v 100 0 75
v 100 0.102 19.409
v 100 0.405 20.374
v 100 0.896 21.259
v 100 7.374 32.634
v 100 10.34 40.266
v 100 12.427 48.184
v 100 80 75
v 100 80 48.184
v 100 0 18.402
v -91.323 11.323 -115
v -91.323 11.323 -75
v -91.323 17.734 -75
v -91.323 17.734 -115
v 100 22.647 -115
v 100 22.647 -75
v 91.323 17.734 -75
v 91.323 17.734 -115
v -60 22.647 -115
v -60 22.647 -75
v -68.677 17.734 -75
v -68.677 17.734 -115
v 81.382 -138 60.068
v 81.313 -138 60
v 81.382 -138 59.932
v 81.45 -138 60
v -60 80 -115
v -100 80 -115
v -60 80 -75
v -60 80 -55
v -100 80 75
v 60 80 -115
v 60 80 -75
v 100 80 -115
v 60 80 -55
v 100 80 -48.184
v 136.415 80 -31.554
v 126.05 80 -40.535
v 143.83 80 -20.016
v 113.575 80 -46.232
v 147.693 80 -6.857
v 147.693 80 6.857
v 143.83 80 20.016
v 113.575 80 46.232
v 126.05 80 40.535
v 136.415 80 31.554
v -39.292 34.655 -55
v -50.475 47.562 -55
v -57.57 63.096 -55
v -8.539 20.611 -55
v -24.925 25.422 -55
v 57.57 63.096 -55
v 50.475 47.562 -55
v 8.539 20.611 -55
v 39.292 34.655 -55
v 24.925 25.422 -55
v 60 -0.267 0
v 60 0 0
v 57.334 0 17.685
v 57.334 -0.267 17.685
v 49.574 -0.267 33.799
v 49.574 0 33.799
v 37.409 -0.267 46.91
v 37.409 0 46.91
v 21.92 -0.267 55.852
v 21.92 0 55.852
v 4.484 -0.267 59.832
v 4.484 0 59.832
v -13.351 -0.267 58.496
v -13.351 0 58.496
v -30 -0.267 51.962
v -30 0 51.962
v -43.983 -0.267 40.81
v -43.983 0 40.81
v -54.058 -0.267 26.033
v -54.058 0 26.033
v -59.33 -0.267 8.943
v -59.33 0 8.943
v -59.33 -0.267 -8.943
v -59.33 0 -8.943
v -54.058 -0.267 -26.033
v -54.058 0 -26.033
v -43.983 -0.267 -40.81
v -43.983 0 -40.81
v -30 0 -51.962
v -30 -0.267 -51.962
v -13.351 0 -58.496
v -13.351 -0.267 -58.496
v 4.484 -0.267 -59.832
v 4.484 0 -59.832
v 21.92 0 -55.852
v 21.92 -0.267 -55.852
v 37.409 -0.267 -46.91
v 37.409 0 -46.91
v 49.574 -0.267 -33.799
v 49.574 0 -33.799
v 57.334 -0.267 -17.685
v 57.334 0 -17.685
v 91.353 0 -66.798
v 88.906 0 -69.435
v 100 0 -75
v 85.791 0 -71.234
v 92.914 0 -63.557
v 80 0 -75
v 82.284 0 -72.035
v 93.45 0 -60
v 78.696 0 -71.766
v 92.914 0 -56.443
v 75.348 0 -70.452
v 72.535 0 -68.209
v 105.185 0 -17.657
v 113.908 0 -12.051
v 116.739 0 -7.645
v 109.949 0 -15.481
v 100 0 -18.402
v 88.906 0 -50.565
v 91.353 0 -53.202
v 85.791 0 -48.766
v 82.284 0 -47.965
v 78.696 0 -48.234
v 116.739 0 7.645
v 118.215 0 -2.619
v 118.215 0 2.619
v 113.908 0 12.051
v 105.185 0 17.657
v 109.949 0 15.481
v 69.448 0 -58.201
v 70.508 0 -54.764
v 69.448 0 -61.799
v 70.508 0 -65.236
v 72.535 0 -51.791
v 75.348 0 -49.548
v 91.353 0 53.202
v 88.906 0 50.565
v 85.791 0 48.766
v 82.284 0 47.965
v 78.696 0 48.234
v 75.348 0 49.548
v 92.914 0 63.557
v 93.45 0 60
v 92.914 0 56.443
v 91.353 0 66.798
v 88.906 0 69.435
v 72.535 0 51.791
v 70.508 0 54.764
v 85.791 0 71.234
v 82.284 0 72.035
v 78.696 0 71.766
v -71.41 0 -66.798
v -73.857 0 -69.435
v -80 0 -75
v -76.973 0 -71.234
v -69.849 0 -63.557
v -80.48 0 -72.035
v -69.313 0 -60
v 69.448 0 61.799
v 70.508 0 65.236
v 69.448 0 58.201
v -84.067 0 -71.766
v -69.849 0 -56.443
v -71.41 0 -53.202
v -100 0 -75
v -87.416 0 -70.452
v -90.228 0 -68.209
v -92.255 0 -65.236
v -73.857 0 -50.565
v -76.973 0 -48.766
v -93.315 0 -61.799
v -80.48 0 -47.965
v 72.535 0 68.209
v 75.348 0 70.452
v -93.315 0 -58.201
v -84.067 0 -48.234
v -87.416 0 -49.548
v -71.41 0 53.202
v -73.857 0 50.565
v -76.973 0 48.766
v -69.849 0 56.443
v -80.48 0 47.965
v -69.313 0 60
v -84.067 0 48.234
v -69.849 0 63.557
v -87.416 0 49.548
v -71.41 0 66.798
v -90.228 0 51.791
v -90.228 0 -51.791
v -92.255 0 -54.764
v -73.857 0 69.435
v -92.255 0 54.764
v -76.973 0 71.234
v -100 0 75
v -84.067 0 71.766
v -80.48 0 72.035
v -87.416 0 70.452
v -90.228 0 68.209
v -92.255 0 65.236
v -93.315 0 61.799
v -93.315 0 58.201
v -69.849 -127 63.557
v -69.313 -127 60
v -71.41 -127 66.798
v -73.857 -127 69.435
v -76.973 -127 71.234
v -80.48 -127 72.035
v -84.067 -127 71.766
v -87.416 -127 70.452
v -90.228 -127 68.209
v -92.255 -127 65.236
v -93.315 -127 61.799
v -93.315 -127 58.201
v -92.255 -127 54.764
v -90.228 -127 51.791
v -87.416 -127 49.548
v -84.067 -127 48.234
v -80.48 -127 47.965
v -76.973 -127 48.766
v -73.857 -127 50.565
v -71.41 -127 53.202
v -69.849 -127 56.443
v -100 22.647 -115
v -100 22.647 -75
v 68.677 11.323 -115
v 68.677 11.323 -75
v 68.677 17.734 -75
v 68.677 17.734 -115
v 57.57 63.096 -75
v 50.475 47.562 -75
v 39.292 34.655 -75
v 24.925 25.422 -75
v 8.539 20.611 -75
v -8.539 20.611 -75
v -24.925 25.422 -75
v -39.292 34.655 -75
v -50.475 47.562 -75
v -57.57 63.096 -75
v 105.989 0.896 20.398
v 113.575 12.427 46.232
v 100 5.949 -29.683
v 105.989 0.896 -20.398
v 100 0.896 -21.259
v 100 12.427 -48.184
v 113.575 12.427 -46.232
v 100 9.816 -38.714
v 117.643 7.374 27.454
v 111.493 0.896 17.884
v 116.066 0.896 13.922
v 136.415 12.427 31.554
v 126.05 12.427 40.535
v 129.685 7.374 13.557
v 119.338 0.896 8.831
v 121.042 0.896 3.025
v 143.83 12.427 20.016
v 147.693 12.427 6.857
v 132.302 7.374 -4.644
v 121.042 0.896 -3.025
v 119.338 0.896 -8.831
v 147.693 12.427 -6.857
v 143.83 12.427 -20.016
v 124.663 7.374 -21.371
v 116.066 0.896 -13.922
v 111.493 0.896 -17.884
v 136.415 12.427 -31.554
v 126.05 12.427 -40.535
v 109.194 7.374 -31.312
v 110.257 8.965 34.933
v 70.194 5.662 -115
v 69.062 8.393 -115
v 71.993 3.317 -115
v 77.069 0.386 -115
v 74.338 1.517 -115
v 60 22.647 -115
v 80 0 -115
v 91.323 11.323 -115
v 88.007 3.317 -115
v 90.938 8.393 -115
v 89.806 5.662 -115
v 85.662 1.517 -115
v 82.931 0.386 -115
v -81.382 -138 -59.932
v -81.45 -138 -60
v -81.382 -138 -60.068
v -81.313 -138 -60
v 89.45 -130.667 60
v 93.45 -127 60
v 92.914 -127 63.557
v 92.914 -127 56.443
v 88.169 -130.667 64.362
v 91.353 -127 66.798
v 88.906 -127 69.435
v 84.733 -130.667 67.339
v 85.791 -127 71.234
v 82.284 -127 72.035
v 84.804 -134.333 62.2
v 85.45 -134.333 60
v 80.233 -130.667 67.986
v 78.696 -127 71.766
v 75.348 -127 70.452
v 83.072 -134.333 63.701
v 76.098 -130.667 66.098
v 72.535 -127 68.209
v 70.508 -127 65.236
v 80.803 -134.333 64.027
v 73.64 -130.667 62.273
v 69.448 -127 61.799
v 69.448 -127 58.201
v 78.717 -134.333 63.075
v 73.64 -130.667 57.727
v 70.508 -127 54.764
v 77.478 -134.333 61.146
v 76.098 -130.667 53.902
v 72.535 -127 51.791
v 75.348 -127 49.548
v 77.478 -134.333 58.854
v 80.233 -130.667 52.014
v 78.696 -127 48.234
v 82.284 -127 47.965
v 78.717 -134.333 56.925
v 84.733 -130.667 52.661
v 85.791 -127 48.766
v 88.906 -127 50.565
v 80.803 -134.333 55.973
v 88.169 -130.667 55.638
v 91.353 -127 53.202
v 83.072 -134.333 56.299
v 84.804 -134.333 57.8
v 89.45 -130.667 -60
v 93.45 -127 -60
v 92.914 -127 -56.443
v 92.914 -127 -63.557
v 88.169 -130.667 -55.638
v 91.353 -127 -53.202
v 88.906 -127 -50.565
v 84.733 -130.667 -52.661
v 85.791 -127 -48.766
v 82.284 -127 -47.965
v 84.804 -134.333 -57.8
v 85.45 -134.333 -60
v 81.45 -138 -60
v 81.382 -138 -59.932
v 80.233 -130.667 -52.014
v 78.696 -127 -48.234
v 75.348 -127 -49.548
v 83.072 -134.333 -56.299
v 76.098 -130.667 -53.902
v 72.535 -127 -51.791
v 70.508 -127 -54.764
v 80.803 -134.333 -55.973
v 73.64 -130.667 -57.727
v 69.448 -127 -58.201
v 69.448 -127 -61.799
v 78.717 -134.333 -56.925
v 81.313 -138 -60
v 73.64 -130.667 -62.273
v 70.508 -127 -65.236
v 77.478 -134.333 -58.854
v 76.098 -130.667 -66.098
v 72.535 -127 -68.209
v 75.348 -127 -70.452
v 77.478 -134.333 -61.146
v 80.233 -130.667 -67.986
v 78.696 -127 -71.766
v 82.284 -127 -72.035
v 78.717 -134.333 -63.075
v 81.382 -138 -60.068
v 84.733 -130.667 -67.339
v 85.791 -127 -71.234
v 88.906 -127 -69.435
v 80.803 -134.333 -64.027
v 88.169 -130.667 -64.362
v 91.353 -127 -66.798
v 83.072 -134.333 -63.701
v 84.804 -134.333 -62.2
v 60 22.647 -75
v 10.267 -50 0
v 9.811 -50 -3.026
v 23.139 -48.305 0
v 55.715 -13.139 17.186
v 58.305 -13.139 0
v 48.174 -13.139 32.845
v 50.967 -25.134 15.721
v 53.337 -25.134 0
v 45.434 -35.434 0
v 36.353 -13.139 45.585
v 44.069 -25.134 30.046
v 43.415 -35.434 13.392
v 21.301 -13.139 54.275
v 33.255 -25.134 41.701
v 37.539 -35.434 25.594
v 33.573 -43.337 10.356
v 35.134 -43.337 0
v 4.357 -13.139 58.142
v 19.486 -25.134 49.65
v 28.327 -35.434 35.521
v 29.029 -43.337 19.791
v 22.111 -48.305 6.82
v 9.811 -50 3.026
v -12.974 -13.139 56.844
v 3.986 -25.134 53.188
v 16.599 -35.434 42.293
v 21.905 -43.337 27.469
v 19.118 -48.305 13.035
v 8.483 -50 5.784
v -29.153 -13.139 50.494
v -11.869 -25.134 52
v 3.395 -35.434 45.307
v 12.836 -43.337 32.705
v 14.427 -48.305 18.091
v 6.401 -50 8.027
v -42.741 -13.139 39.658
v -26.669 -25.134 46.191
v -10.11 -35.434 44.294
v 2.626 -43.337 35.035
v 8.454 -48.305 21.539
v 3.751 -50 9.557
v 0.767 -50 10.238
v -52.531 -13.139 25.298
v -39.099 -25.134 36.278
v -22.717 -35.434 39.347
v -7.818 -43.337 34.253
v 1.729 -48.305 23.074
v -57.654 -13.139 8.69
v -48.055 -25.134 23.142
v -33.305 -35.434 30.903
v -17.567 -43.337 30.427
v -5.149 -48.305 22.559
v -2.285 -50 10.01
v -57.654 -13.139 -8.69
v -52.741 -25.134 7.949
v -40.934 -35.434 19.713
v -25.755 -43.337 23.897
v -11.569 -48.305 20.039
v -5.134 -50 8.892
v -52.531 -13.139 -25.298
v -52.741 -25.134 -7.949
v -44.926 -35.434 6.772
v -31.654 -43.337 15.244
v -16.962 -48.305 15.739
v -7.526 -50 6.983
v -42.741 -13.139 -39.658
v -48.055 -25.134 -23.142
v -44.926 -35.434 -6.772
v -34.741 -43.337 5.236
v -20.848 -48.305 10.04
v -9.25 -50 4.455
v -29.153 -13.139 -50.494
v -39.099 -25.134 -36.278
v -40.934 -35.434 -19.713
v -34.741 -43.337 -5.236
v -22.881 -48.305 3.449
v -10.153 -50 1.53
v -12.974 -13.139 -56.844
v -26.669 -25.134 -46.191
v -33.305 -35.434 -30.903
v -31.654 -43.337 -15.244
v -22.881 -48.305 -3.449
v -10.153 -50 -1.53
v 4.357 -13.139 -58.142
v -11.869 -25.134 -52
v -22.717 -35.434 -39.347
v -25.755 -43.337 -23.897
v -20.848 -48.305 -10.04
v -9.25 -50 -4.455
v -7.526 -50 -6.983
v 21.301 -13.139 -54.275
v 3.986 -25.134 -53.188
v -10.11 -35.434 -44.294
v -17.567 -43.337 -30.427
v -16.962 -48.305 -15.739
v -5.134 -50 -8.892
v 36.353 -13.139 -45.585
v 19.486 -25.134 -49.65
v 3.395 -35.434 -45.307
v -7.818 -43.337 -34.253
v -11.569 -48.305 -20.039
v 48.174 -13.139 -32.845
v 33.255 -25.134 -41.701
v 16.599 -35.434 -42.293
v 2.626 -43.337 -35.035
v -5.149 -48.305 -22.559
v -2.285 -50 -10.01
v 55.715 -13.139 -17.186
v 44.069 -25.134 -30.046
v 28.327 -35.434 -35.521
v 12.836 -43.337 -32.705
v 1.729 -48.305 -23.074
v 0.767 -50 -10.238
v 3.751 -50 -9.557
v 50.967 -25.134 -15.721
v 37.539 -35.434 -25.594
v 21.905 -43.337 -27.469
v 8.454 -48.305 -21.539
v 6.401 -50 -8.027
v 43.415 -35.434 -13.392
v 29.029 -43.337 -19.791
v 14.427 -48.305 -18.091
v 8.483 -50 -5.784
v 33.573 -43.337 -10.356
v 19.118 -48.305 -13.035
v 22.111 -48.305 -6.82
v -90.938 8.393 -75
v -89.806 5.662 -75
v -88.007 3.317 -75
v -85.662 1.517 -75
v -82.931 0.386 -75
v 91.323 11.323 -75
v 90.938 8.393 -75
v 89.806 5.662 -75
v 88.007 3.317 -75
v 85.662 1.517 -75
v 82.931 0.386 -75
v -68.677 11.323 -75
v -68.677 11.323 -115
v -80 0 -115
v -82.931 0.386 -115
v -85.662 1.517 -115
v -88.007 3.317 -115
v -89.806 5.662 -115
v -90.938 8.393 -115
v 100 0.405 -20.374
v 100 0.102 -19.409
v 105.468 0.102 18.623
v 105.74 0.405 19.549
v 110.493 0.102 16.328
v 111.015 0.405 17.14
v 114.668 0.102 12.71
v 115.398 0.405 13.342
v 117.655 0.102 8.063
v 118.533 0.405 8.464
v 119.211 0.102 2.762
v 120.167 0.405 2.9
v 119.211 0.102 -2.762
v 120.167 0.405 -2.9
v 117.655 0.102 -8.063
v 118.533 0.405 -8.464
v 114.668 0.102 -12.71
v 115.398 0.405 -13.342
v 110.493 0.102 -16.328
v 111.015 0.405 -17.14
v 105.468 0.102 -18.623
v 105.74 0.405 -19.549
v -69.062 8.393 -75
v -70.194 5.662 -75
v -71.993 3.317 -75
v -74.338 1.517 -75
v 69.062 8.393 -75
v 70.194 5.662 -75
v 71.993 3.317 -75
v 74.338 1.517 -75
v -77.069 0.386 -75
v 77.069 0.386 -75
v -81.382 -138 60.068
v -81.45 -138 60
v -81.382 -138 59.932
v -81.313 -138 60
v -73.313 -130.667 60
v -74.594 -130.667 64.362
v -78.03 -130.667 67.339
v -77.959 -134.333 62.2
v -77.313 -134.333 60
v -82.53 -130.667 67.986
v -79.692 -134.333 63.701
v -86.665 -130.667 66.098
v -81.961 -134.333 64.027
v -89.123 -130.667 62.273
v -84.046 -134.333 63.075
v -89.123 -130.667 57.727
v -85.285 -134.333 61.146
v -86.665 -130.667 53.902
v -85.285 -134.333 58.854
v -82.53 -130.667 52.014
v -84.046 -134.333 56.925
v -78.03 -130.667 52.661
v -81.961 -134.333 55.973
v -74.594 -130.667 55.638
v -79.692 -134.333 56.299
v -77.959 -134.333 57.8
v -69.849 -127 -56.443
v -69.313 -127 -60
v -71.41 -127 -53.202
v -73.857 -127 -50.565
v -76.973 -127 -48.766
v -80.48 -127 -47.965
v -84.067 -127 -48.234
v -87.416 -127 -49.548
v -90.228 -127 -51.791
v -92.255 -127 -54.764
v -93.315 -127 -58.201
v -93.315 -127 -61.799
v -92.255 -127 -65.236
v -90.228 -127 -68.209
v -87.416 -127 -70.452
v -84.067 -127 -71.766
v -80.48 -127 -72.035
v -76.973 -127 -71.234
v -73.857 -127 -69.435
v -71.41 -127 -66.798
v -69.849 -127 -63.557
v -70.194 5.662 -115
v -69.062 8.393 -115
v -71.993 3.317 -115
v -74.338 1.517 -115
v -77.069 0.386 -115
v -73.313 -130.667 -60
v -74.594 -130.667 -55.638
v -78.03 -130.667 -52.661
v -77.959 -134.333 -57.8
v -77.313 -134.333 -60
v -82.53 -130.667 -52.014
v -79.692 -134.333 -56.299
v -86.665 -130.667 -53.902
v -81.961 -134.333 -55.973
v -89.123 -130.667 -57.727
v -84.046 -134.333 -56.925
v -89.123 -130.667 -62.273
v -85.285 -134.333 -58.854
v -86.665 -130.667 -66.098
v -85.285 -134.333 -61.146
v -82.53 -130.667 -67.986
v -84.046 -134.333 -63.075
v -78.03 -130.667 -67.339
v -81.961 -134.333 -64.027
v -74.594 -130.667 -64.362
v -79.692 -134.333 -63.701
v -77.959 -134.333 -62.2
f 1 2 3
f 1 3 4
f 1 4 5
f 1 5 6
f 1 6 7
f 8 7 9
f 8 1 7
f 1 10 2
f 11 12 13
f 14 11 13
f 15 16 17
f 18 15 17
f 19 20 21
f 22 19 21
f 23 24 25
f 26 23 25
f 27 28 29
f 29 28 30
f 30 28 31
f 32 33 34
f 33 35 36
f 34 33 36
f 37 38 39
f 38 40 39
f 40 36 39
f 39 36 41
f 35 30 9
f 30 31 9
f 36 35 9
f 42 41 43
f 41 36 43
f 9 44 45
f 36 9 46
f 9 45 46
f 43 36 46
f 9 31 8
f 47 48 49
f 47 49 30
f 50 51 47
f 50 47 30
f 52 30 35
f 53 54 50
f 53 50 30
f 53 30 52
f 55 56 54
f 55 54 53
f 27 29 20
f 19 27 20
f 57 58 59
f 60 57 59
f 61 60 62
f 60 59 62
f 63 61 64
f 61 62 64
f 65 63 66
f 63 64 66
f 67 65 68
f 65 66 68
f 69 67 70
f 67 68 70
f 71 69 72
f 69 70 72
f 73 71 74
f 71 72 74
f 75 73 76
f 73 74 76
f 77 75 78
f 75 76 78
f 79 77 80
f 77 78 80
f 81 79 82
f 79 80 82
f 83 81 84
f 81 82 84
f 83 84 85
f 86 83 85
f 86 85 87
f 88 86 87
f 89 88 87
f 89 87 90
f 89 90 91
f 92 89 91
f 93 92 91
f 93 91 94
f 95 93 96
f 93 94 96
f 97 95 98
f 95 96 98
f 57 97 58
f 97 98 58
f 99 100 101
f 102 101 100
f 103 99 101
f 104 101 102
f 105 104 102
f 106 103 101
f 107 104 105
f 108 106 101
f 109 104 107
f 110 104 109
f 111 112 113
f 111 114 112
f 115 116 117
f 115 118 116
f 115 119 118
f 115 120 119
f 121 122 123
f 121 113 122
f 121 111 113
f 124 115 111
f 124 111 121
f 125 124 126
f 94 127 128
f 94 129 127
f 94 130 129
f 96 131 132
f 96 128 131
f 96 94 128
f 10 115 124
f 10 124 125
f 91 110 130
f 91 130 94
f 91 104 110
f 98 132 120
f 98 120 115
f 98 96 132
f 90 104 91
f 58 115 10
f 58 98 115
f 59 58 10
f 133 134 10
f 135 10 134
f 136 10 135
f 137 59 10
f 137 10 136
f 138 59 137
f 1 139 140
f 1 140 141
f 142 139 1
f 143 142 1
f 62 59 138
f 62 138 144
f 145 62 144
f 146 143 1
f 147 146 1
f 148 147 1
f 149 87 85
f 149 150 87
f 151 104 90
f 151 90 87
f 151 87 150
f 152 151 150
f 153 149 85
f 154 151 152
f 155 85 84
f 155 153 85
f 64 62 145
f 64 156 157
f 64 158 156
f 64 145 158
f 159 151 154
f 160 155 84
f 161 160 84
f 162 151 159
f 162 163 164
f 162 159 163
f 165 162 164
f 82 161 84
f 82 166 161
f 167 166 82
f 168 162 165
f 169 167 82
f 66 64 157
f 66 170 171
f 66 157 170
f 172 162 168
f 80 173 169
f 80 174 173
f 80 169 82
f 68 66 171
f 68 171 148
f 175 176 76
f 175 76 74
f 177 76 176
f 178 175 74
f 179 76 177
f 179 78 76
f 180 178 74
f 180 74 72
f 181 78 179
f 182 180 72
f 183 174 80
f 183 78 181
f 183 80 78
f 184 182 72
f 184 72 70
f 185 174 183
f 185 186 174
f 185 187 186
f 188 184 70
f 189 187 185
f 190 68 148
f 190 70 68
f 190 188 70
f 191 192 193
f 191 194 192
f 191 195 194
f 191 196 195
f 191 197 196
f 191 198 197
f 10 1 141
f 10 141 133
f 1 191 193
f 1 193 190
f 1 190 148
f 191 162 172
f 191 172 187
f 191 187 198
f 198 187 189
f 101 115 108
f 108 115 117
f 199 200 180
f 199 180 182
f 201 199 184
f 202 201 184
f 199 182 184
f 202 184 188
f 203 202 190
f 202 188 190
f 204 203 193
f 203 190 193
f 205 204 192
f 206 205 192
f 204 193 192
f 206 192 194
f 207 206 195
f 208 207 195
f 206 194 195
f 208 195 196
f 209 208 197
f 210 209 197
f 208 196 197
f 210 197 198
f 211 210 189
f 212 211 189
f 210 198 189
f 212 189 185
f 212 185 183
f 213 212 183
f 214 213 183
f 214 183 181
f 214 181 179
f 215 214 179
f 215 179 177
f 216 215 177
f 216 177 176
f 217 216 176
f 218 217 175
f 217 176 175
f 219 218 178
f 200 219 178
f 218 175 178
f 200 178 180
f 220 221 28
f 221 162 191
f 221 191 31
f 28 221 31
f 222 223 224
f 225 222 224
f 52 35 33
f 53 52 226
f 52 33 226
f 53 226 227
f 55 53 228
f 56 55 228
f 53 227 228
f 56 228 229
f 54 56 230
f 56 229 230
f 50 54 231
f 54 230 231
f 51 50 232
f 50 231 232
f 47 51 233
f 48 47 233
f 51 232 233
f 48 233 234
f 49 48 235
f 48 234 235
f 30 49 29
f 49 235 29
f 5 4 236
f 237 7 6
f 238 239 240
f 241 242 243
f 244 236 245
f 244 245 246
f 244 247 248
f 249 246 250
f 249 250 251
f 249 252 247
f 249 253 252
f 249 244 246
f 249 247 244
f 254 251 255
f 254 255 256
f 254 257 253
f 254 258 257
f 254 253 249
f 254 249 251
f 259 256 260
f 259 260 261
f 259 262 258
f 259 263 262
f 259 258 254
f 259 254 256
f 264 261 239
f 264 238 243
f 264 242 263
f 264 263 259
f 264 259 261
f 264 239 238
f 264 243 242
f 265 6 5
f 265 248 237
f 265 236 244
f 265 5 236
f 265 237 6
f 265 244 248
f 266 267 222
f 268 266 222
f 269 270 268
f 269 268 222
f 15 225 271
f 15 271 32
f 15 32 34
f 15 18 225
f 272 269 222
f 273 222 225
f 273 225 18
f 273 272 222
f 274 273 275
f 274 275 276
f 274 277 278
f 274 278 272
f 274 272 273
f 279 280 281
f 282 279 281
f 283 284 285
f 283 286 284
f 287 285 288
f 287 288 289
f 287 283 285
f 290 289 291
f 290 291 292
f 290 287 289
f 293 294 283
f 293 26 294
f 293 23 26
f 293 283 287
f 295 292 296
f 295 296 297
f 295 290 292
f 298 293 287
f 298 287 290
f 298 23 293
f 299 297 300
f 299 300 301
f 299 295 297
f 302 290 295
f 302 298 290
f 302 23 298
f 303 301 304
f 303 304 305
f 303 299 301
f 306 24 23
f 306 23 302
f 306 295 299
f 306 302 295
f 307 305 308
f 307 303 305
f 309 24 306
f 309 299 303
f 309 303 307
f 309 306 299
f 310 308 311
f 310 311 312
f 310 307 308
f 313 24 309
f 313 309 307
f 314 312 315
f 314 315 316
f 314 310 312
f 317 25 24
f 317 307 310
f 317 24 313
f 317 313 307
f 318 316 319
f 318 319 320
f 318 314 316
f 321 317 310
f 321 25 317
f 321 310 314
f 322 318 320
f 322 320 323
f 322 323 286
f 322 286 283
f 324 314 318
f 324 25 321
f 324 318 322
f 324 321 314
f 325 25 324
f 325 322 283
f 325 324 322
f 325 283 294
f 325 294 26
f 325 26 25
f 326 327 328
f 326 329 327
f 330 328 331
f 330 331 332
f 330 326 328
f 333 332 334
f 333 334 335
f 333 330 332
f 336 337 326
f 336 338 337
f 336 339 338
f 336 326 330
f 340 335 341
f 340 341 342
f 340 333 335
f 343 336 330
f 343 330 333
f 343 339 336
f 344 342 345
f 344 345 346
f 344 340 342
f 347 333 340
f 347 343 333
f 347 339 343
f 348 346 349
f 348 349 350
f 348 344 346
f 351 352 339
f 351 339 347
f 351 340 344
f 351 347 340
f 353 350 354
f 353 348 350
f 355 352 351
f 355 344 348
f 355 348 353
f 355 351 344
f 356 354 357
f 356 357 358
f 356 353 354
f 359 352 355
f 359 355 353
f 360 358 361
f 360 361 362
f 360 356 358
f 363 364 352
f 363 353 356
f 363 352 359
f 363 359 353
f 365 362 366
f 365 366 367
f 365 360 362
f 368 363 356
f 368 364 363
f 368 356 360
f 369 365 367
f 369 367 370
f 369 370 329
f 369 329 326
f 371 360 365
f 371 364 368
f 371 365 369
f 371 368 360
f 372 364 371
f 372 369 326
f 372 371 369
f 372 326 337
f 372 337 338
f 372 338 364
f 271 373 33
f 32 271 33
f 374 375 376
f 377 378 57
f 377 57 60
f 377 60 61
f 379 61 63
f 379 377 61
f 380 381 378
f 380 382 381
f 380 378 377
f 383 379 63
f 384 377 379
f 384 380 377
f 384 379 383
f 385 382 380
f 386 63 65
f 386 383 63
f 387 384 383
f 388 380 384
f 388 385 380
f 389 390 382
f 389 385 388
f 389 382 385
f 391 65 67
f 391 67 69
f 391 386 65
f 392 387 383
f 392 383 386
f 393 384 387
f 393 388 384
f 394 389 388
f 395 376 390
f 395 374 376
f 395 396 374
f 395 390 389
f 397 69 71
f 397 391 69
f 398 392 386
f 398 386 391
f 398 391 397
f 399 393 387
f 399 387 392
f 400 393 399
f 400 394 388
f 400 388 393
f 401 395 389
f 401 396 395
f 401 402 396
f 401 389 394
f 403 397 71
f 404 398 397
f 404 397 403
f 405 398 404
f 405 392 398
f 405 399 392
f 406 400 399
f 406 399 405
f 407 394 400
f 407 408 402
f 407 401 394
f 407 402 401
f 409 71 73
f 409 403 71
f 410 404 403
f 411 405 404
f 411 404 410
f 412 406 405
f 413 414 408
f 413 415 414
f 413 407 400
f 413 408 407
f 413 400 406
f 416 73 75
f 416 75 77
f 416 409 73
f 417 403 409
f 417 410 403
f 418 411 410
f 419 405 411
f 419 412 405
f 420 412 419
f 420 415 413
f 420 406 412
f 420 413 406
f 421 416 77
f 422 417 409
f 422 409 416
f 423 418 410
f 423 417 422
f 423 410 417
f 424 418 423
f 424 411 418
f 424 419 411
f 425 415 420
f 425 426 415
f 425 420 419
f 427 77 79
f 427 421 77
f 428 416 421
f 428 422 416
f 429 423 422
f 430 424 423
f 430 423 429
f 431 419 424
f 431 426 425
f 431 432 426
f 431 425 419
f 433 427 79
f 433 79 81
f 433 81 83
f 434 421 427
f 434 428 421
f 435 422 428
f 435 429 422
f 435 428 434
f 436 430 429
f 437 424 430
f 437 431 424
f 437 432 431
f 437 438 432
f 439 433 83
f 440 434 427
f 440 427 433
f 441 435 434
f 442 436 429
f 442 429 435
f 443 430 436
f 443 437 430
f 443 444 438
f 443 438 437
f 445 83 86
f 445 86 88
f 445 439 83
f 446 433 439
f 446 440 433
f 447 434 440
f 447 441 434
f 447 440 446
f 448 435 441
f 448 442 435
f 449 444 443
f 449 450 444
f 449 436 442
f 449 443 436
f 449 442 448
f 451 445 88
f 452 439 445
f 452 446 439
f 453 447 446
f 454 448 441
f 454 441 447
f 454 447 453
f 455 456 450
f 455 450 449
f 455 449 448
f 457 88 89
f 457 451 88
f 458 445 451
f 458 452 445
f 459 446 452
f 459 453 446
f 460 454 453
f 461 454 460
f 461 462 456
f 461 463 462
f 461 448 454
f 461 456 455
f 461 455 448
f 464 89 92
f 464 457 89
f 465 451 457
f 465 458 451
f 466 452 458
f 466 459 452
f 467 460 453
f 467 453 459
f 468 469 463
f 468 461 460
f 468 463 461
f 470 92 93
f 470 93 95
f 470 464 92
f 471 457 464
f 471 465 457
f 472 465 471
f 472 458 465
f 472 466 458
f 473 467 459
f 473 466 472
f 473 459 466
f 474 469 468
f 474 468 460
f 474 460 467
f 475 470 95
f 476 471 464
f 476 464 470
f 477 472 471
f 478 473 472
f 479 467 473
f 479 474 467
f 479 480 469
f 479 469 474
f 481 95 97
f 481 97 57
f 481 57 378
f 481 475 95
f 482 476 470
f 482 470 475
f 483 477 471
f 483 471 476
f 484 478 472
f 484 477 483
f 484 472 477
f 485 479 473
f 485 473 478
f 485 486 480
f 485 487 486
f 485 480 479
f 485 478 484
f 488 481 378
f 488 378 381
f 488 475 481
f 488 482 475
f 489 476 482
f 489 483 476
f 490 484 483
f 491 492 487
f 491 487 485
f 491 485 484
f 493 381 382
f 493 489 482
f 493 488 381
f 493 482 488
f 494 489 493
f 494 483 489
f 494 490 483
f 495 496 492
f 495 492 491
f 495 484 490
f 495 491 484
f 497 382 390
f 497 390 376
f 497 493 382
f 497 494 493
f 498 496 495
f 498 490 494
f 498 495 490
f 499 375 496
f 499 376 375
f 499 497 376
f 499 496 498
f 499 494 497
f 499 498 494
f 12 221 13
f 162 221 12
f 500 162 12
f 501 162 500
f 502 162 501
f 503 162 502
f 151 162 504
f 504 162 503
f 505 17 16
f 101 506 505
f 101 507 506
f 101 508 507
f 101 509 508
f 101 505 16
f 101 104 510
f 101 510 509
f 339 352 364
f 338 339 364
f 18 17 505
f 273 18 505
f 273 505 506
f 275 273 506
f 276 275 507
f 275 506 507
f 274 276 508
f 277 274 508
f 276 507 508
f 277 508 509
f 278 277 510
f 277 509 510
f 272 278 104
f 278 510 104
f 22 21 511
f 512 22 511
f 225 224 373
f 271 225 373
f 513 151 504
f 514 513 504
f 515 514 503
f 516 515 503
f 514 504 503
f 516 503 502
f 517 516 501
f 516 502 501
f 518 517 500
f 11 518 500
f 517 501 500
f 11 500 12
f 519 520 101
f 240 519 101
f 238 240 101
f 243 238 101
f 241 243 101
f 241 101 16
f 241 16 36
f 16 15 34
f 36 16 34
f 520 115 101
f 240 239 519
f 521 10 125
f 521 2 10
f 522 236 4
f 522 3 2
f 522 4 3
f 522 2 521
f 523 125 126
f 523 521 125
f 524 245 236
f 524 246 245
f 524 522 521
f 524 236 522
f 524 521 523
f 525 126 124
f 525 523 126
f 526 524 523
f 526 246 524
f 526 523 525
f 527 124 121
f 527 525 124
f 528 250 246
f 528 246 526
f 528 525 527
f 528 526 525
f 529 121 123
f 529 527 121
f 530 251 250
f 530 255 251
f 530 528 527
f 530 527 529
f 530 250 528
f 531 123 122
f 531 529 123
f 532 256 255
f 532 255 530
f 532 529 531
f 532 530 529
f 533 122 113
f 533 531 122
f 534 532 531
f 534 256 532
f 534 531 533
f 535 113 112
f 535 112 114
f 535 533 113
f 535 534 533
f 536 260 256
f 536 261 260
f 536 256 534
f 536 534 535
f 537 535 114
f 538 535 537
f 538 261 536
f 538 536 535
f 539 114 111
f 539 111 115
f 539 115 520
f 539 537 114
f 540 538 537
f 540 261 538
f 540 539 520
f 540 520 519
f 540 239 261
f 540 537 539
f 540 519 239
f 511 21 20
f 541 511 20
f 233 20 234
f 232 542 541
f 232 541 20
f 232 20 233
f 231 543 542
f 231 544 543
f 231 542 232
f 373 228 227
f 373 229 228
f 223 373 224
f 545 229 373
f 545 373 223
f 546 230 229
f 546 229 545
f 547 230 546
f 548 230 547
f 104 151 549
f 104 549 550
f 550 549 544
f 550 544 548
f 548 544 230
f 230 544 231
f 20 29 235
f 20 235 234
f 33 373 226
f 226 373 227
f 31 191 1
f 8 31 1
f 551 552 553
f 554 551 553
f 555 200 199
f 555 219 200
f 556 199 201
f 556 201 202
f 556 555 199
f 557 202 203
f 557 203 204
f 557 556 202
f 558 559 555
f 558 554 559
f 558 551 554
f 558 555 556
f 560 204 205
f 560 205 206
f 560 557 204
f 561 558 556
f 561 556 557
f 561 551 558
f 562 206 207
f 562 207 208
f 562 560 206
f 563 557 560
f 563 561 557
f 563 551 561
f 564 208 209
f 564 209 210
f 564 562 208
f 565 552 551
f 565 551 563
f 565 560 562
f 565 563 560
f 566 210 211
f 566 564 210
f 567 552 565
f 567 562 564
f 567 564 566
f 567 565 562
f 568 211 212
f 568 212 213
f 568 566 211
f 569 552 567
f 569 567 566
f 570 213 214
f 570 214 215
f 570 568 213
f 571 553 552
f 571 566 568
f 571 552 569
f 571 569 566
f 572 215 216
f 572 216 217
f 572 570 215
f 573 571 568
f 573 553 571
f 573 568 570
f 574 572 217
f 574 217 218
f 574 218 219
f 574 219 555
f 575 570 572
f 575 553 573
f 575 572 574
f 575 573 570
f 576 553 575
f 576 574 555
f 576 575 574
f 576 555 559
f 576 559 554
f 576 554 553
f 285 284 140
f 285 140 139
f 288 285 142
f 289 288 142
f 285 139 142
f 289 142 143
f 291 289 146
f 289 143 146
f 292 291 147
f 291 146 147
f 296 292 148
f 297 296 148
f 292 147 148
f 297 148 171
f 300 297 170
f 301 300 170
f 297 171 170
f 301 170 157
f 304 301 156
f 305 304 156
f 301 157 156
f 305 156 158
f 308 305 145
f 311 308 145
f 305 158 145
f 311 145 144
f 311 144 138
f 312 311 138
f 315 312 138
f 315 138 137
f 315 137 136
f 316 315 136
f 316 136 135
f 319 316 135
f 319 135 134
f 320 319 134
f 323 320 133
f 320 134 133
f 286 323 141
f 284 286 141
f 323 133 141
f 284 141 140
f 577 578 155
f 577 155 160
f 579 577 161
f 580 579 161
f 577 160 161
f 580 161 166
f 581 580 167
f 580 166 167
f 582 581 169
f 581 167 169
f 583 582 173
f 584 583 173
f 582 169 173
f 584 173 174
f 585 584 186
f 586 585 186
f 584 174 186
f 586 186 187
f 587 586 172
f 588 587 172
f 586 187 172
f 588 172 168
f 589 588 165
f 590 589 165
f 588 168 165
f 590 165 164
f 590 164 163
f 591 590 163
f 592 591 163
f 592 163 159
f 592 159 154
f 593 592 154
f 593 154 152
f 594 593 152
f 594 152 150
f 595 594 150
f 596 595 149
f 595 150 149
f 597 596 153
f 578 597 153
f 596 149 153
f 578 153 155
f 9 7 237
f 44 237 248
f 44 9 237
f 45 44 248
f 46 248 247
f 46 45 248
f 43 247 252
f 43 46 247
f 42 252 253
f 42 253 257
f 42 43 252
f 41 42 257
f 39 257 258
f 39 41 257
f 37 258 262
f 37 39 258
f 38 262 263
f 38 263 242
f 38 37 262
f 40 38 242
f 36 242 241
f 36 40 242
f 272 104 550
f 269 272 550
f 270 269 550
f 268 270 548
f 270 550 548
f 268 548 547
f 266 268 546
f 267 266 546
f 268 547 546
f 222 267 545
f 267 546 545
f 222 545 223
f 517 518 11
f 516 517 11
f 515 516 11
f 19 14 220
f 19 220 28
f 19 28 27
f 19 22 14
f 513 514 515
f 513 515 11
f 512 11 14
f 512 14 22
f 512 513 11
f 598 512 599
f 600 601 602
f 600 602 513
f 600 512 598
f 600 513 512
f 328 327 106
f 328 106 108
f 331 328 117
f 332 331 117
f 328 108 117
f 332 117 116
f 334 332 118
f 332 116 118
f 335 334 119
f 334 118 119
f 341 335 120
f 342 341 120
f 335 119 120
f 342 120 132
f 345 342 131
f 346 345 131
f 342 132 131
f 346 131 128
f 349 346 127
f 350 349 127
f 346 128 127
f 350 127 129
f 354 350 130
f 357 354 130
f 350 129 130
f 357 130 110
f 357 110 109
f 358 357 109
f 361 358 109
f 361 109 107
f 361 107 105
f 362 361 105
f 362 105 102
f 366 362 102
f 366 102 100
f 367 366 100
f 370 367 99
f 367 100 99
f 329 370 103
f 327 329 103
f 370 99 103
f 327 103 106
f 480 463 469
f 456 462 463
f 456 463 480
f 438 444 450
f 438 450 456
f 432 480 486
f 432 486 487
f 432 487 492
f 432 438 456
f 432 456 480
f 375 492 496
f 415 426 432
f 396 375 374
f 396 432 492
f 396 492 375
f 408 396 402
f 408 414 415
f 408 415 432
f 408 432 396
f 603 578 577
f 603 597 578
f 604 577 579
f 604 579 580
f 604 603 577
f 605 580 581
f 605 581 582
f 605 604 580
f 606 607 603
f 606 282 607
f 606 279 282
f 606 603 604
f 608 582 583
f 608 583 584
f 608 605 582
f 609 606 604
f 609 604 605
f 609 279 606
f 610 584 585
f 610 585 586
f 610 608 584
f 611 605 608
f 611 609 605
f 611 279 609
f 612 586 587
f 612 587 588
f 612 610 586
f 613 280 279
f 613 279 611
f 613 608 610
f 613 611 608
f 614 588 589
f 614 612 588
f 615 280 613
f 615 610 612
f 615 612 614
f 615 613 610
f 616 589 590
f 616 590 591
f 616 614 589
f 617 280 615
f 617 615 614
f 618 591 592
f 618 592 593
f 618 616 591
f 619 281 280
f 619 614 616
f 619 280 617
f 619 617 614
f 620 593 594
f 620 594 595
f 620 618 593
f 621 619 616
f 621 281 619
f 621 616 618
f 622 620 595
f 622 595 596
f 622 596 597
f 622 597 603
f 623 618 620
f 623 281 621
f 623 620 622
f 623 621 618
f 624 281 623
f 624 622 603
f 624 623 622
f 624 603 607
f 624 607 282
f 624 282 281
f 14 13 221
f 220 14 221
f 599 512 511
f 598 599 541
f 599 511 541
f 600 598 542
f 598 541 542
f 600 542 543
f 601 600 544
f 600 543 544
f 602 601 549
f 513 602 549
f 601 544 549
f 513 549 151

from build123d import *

# Parameters (mm, degrees)
F0_W         = 200
F0_H         = 150
F0_R         = 12.0683860383
F0_R_2       = 60
F1_DEPTH     = 80
F2_DEPTH     = 138
F3_C1_SIZE2  = 12
F3_C1_SIZE   = 11
F3_C2_SIZE2  = 12
F3_C2_SIZE   = 11
F3_C3_SIZE2  = 12
F3_C3_SIZE   = 11
F3_C4_SIZE2  = 12
F3_C4_SIZE   = 11
F4_DEPTH     = 50
F5_R         = 49.7327993849
F7_DEPTH     = 40
F8_DEPTH     = 20
F11_T2_ANGLE = 180


# Not quite as in the source:
# - a fillet or chamfer that OpenCascade refuses, or shapes differently, is made with other operations: its cross-section is extruded or revolved along the edge and cut away or added


with BuildPart() as f1:
    # F0 (on Front) → F1 (new body)
    with BuildSketch(Plane.XZ):
        Rectangle(F0_W, F0_H)
        with Locations((-81.3817187923, -60)):
            Circle(F0_R, mode=Mode.SUBTRACT)
        with Locations((81.3817187923, -60)):
            Circle(F0_R, mode=Mode.SUBTRACT)
        with Locations((-81.3817187923, 60)):
            Circle(F0_R, mode=Mode.SUBTRACT)
        Circle(F0_R_2, mode=Mode.SUBTRACT)
        with Locations((81.3817187923, 60)):
            Circle(F0_R, mode=Mode.SUBTRACT)
        Circle(F0_R_2)
        with Locations((81.3817187923, -60)):
            Circle(F0_R)
        with Locations((-81.3817187923, 60)):
            Circle(F0_R)
        with Locations((-81.3817187923, -60)):
            Circle(F0_R)
        with Locations((81.3817187923, 60)):
            Circle(F0_R)
    extrude(amount=-F1_DEPTH)

    # F0 (on Front) → F2 (join)
    with BuildSketch(Plane.XZ):
        with Locations((-81.3817187923, 60)):
            Circle(F0_R)
        with Locations((81.3817187923, 60)):
            Circle(F0_R)
        with Locations((81.3817187923, -60)):
            Circle(F0_R)
        with Locations((-81.3817187923, -60)):
            Circle(F0_R)
    extrude(amount=F2_DEPTH)

    # F3: chamfer of 12 x 11 on 4 edges, made by hand

    # F3_c1
    f3_c1_edges = [f1.edges().sort_by_distance(p)[0] for p in [
        (-93.4501048306, -138, -60),
    ]]
    f3_c1_side = f1.faces().sort_by_distance((-93.4501048306, -137.78, -60))[0]
    chamfer(f3_c1_edges, length=F3_C1_SIZE, length2=F3_C1_SIZE2, reference=f3_c1_side)

    # F3_c2
    f3_c2_edges = [f1.edges().sort_by_distance(p)[0] for p in [
        (69.313332754, -138, -60),
    ]]
    f3_c2_side = f1.faces().sort_by_distance((69.313332754, -137.78, -60))[0]
    chamfer(f3_c2_edges, length=F3_C2_SIZE, length2=F3_C2_SIZE2, reference=f3_c2_side)

    # F3_c3
    f3_c3_edges = [f1.edges().sort_by_distance(p)[0] for p in [
        (-93.4501048306, -138, 60),
    ]]
    f3_c3_side = f1.faces().sort_by_distance((-93.4501048306, -137.78, 60))[0]
    chamfer(f3_c3_edges, length=F3_C3_SIZE, length2=F3_C3_SIZE2, reference=f3_c3_side)

    # F3_c4
    f3_c4_edges = [f1.edges().sort_by_distance(p)[0] for p in [
        (69.313332754, -138, 60),
    ]]
    f3_c4_side = f1.faces().sort_by_distance((69.313332754, -137.78, 60))[0]
    chamfer(f3_c4_edges, length=F3_C4_SIZE, length2=F3_C4_SIZE2, reference=f3_c4_side)

    # F0 (on Front) → F4 (join)
    with BuildSketch(Plane.XZ):
        Circle(F0_R_2)
    extrude(amount=F4_DEPTH)

    # F5
    f5_edges = [f1.edges().sort_by_distance(p)[0] for p in [
        (-60, -50, 0),
    ]]
    fillet(f5_edges, radius=F5_R)

    # F6 (on face) → F7 (join)
    with BuildSketch(Plane(origin=(0, 0, -75), x_dir=(1, 0, 0), z_dir=(0, 0, -1))):
        with BuildLine():
            ThreePointArc((-68.6766029522, -11.3233970478), (-71.9931491676, -3.316546203), (-80.0000000175, 0))
            ThreePointArc((-80.0000000175, 0), (-88.0068508448, -3.3165462154), (-91.3233970478, -11.3233970478))
            Line((-91.3233970478, -11.3233970478), (-91.3233970478, -17.7343630829))
            Line((-91.3233970478, -17.7343630829), (-100, -22.6467940956))
            Line((-100, -22.6467940956), (-100, -80))
            Line((-100, -80), (-60, -80))
            Line((-60, -80), (-60, -22.6467940956))
            Line((-60, -22.6467940956), (-68.6766029522, -17.7343630829))
            Line((-68.6766029522, -17.7343630829), (-68.6766029522, -11.3233970478))
        make_face()
        with BuildLine():
            Line((68.6766029522, -17.7343630829), (60, -22.6467940956))
            Line((60, -22.6467940956), (60, -80))
            Line((60, -80), (100, -80))
            Line((100, -80), (100, -22.6467940956))
            Line((100, -22.6467940956), (91.3233970478, -17.7343630829))
            Line((91.3233970478, -17.7343630829), (91.3233970478, -11.3233970478))
            ThreePointArc((91.3233970478, -11.3233970478), (88.0068508386, -3.3165462092), (80, 0))
            ThreePointArc((80, 0), (71.9931491614, -3.3165462092), (68.6766029522, -11.3233970478))
            Line((68.6766029522, -11.3233970478), (68.6766029522, -17.7343630829))
        make_face()
    extrude(amount=F7_DEPTH)

    # F6 (on face) → F8 (cut)
    with BuildSketch(Plane(origin=(0, 0, -75), x_dir=(1, 0, 0), z_dir=(0, 0, -1))):
        with BuildLine():
            ThreePointArc((60, -80), (0, -20), (-60, -80))
            Line((-60, -80), (60, -80))
        make_face()
    extrude(amount=-F8_DEPTH, mode=Mode.SUBTRACT)

    # F9 (on face) → F10 (revolve)
    with BuildSketch(Plane.YZ.offset(100)):
        with BuildLine():
            Line((80, 0), (0, 0))
            Line((0, 0), (0, -20))
            ThreePointArc((0, -20), (7.7276234195, -33.4243037519), (12.4269118533, -48.1838695705))
            Line((12.4269118533, -48.1838695705), (80, -48.1838695705))
            Line((80, -48.1838695705), (80, 0))
        make_face()
    revolve(axis=Axis((100, 40, 0), (0, 1, 0)))

    # F11: fillet of radius 5 on 1 edges, made by hand

    # F11_s1 → F11_t2 (revolve, cut)
    with BuildSketch(Plane.YZ.offset(100)):
        with BuildLine():
            ThreePointArc((0, 18.4024363766), (0.2292975701, 19.8992323966), (0.8961593302, 21.2587437405))
            ThreePointArc((0.8961593302, 21.2587437405), (0.451433447, 20.6269841539), (0, 20))
            Line((0, 20), (0, 18.4024363766))
        make_face()
    revolve(axis=Axis((100, 0, 0), (0, 1, 0)), revolution_arc=F11_T2_ANGLE, mode=Mode.SUBTRACT)


solid = f1.part
